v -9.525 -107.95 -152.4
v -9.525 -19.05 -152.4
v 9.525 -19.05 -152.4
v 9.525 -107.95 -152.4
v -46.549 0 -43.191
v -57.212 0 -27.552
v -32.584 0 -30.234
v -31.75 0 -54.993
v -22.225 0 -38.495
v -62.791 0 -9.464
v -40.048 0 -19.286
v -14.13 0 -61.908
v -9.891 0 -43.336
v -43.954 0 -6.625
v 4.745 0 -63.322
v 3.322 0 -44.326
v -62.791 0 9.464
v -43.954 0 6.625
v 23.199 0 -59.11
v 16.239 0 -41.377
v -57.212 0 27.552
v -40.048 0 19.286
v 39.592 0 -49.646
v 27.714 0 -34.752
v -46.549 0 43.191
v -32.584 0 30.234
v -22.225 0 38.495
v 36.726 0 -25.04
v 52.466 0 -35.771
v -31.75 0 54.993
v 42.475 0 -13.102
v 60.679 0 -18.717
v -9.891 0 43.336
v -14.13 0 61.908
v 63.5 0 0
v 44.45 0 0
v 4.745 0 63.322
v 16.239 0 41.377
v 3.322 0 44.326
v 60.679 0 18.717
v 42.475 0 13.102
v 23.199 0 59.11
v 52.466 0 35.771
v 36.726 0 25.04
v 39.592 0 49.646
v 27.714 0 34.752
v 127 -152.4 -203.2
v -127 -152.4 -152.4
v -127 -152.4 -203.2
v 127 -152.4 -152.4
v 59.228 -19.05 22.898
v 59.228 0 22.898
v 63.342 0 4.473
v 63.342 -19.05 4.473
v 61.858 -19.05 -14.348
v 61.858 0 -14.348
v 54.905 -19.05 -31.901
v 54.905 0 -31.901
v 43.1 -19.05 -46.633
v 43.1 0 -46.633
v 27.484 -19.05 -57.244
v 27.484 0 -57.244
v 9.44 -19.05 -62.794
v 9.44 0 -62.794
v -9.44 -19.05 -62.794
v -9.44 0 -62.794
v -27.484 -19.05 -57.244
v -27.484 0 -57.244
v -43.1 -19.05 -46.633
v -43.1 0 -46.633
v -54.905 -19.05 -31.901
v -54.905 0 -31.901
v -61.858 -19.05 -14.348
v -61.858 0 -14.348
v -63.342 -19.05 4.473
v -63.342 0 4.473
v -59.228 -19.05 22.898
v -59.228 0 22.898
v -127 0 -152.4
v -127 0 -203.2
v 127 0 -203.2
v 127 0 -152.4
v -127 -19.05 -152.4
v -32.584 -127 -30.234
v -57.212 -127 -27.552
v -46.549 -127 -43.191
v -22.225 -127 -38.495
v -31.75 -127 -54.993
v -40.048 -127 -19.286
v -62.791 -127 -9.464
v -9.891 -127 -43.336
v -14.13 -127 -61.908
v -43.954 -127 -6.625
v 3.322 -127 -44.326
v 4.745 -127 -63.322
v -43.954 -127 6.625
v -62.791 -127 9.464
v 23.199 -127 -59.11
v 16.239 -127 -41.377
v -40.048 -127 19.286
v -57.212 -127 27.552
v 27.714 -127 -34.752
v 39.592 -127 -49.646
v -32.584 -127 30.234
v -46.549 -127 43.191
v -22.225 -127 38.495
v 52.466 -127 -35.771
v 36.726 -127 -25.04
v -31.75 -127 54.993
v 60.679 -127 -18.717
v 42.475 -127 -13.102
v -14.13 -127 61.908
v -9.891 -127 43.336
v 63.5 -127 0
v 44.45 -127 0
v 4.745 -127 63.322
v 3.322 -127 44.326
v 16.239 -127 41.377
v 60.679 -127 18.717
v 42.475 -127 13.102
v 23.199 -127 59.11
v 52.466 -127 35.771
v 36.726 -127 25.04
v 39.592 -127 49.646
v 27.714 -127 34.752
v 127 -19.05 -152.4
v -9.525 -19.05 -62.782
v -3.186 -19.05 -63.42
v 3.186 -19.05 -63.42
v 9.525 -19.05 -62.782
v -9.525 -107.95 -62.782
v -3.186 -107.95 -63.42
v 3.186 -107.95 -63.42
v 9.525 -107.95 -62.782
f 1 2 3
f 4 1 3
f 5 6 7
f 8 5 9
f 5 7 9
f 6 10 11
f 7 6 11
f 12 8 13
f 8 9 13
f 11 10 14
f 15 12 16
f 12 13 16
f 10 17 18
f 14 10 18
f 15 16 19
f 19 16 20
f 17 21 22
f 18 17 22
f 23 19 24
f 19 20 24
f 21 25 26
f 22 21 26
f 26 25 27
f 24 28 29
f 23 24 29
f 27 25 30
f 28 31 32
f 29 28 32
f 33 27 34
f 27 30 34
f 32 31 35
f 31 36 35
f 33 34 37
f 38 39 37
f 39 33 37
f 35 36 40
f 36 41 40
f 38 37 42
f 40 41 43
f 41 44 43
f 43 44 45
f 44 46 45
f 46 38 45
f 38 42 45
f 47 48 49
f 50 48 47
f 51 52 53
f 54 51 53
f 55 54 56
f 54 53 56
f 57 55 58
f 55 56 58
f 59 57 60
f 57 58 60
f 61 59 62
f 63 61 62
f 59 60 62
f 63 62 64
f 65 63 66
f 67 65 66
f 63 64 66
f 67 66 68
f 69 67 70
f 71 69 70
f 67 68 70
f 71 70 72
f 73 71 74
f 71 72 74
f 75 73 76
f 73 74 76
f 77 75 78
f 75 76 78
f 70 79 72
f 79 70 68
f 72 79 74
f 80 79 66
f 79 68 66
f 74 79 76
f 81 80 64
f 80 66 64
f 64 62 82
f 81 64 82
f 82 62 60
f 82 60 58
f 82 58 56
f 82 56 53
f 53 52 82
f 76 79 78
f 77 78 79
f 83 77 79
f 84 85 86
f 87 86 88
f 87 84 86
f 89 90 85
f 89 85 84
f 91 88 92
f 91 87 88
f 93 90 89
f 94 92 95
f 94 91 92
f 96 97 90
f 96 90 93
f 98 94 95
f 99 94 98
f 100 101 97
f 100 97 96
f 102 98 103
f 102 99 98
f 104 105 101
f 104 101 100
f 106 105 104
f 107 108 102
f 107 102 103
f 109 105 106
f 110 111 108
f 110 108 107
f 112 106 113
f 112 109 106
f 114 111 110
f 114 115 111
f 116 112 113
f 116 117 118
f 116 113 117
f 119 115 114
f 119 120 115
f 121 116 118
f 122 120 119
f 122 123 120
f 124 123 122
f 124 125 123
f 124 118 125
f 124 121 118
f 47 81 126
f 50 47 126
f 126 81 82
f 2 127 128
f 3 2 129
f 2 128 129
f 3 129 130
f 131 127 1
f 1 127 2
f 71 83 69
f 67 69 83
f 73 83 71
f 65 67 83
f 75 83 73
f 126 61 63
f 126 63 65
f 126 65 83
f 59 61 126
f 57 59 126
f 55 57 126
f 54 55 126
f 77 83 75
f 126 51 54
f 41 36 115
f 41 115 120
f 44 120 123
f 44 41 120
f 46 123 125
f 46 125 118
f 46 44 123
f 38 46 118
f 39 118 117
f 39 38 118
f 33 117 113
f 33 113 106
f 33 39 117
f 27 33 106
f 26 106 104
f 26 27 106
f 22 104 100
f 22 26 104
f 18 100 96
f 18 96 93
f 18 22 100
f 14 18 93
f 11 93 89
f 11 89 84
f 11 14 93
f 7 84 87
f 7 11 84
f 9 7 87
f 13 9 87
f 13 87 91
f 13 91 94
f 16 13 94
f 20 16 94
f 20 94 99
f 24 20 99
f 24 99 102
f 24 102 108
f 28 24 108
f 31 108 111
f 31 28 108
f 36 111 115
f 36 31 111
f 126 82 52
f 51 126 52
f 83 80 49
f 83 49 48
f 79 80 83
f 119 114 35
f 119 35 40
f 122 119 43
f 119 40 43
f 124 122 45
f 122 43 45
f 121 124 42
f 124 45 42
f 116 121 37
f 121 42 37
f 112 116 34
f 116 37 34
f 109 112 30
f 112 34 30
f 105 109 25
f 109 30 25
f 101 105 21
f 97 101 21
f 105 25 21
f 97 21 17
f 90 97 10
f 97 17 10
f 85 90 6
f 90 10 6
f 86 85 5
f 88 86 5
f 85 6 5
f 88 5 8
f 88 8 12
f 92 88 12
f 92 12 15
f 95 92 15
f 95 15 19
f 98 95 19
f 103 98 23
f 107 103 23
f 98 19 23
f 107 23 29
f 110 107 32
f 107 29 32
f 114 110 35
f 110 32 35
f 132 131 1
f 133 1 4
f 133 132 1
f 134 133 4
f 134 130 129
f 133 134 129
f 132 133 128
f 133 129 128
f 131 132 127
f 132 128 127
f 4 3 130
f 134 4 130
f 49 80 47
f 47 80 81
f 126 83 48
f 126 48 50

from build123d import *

# Parameters (mm, degrees)
F0_R     = 63.5
F0_R_2   = 44.45
F1_DEPTH = 127
F3_DEPTH = 19.05
F4_W     = 254
F4_H     = 50.8
F5_DEPTH = 152.4
F7_DEPTH = 88.9


with BuildPart() as f1:
    # F0 (on Front) → F1 (new body)
    with BuildSketch(Plane.XZ):
        Circle(F0_R)
        Circle(F0_R_2, mode=Mode.SUBTRACT)
    extrude(amount=F1_DEPTH)


with BuildPart() as f3:
    # F2 (on Front) → F3 (new body)
    with BuildSketch(Plane.XZ):
        with BuildLine():
            ThreePointArc((59.227747, 22.898122), (0, -63.5), (-59.227747, 22.898122))
            Line((-59.227747, 22.898122), (-127, -152.4))
            Line((-127, -152.4), (127, -152.4))
            Line((127, -152.4), (59.227747, 22.898122))
        make_face()
    extrude(amount=F3_DEPTH)

    # F4 (on Front) → F5 (join)
    with BuildSketch(Plane.XZ):
        with Locations((0, -177.8)):
            Rectangle(F4_W, F4_H)
    extrude(amount=F5_DEPTH)


with BuildPart() as f7:
    # F6 (on face) → F7 (new body)
    with BuildSketch(Plane.XZ.offset(19.05)):
        with BuildLine():
            Line((-9.525, -62.781561), (-9.525, -152.4))
            Line((-9.525, -152.4), (9.525, -152.4))
            Line((9.525, -152.4), (9.525, -62.781561))
            ThreePointArc((9.525, -62.781561), (0, -63.5), (-9.525, -62.781561))
        make_face()
    extrude(amount=F7_DEPTH)


solid = Compound([f1.part, f3.part, f7.part])
